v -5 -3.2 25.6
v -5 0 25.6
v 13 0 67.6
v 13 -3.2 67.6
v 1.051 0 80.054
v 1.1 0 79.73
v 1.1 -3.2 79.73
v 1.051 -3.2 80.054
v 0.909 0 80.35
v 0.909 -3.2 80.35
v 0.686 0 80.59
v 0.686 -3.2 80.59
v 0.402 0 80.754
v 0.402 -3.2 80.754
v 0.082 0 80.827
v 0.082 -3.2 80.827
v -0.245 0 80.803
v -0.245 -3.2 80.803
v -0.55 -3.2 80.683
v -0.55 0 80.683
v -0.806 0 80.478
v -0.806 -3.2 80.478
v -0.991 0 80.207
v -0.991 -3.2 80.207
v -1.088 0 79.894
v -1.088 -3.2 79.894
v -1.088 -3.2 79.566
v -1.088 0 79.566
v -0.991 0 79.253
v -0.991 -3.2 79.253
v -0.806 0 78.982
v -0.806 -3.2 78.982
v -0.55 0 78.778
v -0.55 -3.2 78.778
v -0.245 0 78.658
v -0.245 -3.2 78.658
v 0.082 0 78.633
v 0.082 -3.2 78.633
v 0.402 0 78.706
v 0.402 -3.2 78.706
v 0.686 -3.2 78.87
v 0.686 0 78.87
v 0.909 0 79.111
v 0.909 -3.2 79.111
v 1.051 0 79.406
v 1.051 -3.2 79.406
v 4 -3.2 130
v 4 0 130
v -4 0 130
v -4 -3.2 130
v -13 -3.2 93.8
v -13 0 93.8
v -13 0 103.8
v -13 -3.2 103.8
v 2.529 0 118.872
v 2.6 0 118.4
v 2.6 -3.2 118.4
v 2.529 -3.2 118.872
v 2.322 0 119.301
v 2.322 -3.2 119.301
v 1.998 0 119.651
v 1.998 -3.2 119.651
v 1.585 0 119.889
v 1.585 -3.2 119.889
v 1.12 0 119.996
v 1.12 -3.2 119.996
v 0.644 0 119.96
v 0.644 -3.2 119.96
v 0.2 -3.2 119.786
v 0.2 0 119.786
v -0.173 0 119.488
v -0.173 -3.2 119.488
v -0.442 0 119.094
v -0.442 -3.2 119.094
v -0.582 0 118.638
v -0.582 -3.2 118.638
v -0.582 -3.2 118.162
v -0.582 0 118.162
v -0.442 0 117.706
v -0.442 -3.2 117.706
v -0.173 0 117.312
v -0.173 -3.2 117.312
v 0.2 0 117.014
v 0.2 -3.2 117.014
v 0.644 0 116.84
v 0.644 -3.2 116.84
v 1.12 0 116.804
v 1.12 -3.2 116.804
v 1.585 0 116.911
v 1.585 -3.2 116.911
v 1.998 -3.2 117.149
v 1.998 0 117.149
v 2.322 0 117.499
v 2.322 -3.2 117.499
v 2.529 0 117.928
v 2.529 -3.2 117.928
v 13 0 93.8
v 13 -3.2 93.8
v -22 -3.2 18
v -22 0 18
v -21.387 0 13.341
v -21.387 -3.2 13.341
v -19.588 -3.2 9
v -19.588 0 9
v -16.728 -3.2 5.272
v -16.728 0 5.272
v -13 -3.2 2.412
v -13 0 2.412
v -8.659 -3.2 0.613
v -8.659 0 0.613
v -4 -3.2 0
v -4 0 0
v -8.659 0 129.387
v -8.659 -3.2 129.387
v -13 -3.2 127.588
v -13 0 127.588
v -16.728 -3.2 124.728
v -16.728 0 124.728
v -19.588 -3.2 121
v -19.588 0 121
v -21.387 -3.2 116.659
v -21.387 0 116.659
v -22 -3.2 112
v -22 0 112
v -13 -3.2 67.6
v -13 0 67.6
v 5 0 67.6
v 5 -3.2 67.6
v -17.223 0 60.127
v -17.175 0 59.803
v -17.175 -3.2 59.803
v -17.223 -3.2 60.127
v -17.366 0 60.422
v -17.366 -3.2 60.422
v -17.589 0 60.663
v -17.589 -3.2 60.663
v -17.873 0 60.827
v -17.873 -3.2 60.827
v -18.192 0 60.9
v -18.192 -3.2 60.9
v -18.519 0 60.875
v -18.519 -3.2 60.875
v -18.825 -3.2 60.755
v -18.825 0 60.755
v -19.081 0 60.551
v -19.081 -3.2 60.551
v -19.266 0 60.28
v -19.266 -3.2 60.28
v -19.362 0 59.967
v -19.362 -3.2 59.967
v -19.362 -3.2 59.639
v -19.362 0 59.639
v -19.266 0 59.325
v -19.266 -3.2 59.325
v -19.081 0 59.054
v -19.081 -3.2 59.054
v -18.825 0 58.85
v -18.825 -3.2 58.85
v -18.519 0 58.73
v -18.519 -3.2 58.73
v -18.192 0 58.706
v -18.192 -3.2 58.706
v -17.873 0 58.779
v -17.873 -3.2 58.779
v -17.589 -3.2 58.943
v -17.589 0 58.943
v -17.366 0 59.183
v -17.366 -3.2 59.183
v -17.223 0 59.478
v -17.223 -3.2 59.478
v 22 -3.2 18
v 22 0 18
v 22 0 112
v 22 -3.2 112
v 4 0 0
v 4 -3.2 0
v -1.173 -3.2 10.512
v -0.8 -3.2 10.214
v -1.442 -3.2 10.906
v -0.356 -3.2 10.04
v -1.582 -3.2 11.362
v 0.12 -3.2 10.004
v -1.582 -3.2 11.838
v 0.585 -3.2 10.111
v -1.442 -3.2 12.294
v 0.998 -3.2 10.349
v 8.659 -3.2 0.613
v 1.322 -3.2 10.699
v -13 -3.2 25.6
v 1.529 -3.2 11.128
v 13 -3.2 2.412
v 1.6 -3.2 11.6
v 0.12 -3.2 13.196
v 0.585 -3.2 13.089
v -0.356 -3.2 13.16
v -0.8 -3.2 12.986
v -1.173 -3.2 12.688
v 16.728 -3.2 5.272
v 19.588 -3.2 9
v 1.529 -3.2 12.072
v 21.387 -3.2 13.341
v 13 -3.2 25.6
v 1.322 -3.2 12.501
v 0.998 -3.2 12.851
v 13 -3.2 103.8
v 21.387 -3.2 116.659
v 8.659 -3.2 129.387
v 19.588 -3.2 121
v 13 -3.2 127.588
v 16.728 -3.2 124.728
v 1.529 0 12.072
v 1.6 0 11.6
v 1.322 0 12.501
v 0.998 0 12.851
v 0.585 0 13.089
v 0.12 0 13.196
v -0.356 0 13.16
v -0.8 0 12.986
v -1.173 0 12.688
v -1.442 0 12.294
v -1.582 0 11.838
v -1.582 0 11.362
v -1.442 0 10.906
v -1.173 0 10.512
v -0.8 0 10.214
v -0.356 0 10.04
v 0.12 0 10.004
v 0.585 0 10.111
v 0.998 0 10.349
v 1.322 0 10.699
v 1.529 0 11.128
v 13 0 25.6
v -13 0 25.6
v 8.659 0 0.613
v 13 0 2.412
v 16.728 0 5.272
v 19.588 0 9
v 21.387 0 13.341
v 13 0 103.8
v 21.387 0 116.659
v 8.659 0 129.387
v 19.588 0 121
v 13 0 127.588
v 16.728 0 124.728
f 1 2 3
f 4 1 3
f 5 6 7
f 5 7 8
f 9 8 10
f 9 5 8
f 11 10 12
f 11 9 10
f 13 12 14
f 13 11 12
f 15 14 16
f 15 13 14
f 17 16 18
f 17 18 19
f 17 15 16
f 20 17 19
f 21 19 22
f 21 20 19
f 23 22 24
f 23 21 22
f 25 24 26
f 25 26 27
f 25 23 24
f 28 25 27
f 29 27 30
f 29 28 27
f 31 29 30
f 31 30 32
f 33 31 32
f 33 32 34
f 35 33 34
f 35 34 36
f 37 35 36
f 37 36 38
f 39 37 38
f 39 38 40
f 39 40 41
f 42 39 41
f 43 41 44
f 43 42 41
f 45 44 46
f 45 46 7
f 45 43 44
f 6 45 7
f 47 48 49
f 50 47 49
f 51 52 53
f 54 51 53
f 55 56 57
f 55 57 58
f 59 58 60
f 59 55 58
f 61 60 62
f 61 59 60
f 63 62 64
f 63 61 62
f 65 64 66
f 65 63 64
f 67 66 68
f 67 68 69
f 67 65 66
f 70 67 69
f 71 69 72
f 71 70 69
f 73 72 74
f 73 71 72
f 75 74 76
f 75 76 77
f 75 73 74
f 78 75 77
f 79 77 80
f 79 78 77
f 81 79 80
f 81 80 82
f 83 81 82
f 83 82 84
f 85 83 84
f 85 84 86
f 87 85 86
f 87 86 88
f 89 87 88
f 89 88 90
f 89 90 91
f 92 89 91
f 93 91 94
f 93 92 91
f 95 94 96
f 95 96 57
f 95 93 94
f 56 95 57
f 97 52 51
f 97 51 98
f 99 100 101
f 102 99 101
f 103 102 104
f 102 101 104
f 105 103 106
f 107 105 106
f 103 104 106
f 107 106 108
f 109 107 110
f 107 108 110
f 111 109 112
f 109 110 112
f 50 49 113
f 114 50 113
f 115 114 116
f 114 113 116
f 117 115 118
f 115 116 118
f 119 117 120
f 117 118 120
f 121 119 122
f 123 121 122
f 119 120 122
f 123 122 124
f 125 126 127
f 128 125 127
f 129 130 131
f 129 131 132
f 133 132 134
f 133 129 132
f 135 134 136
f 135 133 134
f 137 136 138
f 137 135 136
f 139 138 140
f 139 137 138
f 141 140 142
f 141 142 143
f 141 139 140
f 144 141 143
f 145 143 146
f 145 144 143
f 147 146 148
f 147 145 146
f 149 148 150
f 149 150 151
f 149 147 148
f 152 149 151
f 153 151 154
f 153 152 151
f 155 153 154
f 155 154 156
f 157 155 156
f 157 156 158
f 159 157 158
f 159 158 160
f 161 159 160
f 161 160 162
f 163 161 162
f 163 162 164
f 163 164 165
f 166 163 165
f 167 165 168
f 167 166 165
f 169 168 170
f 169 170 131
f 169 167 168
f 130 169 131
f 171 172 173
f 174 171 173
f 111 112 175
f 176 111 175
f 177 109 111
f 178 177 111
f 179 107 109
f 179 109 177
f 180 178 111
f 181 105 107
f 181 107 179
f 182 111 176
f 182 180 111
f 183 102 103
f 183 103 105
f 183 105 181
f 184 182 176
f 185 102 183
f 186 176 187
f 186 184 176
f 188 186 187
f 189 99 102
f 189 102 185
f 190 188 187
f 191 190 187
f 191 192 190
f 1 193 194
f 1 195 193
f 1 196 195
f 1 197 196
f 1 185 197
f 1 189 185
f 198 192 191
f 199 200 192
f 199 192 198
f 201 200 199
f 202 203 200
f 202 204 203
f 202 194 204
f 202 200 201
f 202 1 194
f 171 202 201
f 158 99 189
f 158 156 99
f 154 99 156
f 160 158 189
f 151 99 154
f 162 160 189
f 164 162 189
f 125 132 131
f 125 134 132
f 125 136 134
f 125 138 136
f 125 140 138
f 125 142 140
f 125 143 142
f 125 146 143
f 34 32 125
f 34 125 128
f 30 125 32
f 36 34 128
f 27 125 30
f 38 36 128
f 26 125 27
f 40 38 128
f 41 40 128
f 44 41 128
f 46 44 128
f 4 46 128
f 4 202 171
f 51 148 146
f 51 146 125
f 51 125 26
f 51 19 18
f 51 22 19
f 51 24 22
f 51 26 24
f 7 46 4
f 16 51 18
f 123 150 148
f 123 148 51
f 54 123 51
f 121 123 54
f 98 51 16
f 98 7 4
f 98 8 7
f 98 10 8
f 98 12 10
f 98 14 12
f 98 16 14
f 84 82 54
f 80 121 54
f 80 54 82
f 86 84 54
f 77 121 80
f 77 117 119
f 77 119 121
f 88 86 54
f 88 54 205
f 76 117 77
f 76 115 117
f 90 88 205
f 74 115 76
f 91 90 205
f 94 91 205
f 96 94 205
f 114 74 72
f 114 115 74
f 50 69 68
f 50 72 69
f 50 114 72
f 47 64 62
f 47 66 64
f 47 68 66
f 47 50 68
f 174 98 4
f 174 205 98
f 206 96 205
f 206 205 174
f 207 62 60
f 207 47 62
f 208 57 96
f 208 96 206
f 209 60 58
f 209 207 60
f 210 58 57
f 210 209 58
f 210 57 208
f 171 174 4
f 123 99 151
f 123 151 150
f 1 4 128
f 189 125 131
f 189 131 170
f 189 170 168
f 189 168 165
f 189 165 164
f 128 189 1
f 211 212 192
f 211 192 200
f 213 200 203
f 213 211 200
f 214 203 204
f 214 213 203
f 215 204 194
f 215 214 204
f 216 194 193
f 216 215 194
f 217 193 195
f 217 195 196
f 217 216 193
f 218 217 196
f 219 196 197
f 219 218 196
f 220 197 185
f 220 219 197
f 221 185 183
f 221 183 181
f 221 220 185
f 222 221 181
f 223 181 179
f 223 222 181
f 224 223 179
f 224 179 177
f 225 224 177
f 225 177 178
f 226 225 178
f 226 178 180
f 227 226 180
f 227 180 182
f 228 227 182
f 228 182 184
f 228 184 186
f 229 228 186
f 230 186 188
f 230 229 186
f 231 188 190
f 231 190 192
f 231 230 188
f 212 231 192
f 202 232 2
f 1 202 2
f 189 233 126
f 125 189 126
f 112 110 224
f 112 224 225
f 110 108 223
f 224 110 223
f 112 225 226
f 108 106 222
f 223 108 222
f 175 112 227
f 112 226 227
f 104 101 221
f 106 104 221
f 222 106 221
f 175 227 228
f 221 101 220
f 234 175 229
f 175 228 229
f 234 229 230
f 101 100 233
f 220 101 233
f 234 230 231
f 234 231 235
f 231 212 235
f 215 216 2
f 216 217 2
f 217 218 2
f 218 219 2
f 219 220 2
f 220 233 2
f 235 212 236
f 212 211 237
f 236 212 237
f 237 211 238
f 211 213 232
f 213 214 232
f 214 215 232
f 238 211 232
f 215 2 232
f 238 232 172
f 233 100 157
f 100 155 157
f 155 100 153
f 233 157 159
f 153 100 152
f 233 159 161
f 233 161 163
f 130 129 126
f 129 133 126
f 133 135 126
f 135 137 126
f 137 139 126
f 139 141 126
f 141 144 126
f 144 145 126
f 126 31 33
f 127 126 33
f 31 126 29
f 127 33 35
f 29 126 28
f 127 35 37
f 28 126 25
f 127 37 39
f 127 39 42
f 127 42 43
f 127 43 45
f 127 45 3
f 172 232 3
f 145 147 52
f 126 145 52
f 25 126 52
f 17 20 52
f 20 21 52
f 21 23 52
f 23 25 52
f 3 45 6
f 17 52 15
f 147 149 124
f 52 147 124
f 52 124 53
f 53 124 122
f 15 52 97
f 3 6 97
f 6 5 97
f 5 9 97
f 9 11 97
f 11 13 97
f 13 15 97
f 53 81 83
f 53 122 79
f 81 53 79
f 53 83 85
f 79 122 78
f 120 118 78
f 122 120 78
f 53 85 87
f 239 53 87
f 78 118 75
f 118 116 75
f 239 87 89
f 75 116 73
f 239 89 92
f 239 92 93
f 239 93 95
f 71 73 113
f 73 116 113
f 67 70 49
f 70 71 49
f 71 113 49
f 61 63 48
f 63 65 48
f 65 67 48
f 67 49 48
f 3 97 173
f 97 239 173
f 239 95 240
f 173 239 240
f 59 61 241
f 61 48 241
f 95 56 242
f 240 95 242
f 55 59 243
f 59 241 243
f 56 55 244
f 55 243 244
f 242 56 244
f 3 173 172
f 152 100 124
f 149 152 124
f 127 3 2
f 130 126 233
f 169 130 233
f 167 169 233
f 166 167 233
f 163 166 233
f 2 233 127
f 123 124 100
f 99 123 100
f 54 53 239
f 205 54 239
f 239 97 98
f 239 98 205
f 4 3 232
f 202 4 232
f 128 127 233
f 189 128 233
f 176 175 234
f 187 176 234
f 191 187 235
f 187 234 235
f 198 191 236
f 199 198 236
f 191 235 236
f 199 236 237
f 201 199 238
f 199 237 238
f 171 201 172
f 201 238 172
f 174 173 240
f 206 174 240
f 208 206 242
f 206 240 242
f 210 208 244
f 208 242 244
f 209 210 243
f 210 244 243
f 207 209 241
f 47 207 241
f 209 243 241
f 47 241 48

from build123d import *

# Parameters (mm, degrees)
F0_R     = 1.1
F0_R_2   = 1.6
F0_W     = 26
F0_H     = 10
F1_DEPTH = 3.2


with BuildPart() as f1:
    # F0 (on Front) → F1 (new body)
    with BuildSketch(Plane.XZ):
        with BuildLine():
            ThreePointArc((-22, 18), (-16.727922, 5.272078), (-4, 0))
            Line((-4, 0), (4, 0))
            ThreePointArc((4, 0), (16.727922, 5.272078), (22, 18))
            Line((22, 18), (22, 112))
            ThreePointArc((22, 112), (16.727922, 124.727922), (4, 130))
            Line((4, 130), (-4, 130))
            ThreePointArc((-4, 130), (-16.727922, 124.727922), (-22, 112))
            Line((-22, 112), (-22, 18))
        make_face()
        with Locations((-18.274542, 59.802648)):
            Circle(F0_R, mode=Mode.SUBTRACT)
        with Locations((0, 11.6)):
            Circle(F0_R_2, mode=Mode.SUBTRACT)
        Polygon((-5, 25.6), (-13, 25.6), (-13, 67.6), (5, 67.6), (13, 67.6), (13, 25.6), align=None, mode=Mode.SUBTRACT)
        with Locations((0, 79.730161)):
            Circle(F0_R, mode=Mode.SUBTRACT)
        with Locations((0, 98.8)):
            Rectangle(F0_W, F0_H, mode=Mode.SUBTRACT)
        with Locations((1, 118.4)):
            Circle(F0_R_2, mode=Mode.SUBTRACT)
        Polygon((5, 67.6), (-13, 25.6), (-5, 25.6), (13, 67.6), align=None)
    extrude(amount=F1_DEPTH)


solid = f1.part
